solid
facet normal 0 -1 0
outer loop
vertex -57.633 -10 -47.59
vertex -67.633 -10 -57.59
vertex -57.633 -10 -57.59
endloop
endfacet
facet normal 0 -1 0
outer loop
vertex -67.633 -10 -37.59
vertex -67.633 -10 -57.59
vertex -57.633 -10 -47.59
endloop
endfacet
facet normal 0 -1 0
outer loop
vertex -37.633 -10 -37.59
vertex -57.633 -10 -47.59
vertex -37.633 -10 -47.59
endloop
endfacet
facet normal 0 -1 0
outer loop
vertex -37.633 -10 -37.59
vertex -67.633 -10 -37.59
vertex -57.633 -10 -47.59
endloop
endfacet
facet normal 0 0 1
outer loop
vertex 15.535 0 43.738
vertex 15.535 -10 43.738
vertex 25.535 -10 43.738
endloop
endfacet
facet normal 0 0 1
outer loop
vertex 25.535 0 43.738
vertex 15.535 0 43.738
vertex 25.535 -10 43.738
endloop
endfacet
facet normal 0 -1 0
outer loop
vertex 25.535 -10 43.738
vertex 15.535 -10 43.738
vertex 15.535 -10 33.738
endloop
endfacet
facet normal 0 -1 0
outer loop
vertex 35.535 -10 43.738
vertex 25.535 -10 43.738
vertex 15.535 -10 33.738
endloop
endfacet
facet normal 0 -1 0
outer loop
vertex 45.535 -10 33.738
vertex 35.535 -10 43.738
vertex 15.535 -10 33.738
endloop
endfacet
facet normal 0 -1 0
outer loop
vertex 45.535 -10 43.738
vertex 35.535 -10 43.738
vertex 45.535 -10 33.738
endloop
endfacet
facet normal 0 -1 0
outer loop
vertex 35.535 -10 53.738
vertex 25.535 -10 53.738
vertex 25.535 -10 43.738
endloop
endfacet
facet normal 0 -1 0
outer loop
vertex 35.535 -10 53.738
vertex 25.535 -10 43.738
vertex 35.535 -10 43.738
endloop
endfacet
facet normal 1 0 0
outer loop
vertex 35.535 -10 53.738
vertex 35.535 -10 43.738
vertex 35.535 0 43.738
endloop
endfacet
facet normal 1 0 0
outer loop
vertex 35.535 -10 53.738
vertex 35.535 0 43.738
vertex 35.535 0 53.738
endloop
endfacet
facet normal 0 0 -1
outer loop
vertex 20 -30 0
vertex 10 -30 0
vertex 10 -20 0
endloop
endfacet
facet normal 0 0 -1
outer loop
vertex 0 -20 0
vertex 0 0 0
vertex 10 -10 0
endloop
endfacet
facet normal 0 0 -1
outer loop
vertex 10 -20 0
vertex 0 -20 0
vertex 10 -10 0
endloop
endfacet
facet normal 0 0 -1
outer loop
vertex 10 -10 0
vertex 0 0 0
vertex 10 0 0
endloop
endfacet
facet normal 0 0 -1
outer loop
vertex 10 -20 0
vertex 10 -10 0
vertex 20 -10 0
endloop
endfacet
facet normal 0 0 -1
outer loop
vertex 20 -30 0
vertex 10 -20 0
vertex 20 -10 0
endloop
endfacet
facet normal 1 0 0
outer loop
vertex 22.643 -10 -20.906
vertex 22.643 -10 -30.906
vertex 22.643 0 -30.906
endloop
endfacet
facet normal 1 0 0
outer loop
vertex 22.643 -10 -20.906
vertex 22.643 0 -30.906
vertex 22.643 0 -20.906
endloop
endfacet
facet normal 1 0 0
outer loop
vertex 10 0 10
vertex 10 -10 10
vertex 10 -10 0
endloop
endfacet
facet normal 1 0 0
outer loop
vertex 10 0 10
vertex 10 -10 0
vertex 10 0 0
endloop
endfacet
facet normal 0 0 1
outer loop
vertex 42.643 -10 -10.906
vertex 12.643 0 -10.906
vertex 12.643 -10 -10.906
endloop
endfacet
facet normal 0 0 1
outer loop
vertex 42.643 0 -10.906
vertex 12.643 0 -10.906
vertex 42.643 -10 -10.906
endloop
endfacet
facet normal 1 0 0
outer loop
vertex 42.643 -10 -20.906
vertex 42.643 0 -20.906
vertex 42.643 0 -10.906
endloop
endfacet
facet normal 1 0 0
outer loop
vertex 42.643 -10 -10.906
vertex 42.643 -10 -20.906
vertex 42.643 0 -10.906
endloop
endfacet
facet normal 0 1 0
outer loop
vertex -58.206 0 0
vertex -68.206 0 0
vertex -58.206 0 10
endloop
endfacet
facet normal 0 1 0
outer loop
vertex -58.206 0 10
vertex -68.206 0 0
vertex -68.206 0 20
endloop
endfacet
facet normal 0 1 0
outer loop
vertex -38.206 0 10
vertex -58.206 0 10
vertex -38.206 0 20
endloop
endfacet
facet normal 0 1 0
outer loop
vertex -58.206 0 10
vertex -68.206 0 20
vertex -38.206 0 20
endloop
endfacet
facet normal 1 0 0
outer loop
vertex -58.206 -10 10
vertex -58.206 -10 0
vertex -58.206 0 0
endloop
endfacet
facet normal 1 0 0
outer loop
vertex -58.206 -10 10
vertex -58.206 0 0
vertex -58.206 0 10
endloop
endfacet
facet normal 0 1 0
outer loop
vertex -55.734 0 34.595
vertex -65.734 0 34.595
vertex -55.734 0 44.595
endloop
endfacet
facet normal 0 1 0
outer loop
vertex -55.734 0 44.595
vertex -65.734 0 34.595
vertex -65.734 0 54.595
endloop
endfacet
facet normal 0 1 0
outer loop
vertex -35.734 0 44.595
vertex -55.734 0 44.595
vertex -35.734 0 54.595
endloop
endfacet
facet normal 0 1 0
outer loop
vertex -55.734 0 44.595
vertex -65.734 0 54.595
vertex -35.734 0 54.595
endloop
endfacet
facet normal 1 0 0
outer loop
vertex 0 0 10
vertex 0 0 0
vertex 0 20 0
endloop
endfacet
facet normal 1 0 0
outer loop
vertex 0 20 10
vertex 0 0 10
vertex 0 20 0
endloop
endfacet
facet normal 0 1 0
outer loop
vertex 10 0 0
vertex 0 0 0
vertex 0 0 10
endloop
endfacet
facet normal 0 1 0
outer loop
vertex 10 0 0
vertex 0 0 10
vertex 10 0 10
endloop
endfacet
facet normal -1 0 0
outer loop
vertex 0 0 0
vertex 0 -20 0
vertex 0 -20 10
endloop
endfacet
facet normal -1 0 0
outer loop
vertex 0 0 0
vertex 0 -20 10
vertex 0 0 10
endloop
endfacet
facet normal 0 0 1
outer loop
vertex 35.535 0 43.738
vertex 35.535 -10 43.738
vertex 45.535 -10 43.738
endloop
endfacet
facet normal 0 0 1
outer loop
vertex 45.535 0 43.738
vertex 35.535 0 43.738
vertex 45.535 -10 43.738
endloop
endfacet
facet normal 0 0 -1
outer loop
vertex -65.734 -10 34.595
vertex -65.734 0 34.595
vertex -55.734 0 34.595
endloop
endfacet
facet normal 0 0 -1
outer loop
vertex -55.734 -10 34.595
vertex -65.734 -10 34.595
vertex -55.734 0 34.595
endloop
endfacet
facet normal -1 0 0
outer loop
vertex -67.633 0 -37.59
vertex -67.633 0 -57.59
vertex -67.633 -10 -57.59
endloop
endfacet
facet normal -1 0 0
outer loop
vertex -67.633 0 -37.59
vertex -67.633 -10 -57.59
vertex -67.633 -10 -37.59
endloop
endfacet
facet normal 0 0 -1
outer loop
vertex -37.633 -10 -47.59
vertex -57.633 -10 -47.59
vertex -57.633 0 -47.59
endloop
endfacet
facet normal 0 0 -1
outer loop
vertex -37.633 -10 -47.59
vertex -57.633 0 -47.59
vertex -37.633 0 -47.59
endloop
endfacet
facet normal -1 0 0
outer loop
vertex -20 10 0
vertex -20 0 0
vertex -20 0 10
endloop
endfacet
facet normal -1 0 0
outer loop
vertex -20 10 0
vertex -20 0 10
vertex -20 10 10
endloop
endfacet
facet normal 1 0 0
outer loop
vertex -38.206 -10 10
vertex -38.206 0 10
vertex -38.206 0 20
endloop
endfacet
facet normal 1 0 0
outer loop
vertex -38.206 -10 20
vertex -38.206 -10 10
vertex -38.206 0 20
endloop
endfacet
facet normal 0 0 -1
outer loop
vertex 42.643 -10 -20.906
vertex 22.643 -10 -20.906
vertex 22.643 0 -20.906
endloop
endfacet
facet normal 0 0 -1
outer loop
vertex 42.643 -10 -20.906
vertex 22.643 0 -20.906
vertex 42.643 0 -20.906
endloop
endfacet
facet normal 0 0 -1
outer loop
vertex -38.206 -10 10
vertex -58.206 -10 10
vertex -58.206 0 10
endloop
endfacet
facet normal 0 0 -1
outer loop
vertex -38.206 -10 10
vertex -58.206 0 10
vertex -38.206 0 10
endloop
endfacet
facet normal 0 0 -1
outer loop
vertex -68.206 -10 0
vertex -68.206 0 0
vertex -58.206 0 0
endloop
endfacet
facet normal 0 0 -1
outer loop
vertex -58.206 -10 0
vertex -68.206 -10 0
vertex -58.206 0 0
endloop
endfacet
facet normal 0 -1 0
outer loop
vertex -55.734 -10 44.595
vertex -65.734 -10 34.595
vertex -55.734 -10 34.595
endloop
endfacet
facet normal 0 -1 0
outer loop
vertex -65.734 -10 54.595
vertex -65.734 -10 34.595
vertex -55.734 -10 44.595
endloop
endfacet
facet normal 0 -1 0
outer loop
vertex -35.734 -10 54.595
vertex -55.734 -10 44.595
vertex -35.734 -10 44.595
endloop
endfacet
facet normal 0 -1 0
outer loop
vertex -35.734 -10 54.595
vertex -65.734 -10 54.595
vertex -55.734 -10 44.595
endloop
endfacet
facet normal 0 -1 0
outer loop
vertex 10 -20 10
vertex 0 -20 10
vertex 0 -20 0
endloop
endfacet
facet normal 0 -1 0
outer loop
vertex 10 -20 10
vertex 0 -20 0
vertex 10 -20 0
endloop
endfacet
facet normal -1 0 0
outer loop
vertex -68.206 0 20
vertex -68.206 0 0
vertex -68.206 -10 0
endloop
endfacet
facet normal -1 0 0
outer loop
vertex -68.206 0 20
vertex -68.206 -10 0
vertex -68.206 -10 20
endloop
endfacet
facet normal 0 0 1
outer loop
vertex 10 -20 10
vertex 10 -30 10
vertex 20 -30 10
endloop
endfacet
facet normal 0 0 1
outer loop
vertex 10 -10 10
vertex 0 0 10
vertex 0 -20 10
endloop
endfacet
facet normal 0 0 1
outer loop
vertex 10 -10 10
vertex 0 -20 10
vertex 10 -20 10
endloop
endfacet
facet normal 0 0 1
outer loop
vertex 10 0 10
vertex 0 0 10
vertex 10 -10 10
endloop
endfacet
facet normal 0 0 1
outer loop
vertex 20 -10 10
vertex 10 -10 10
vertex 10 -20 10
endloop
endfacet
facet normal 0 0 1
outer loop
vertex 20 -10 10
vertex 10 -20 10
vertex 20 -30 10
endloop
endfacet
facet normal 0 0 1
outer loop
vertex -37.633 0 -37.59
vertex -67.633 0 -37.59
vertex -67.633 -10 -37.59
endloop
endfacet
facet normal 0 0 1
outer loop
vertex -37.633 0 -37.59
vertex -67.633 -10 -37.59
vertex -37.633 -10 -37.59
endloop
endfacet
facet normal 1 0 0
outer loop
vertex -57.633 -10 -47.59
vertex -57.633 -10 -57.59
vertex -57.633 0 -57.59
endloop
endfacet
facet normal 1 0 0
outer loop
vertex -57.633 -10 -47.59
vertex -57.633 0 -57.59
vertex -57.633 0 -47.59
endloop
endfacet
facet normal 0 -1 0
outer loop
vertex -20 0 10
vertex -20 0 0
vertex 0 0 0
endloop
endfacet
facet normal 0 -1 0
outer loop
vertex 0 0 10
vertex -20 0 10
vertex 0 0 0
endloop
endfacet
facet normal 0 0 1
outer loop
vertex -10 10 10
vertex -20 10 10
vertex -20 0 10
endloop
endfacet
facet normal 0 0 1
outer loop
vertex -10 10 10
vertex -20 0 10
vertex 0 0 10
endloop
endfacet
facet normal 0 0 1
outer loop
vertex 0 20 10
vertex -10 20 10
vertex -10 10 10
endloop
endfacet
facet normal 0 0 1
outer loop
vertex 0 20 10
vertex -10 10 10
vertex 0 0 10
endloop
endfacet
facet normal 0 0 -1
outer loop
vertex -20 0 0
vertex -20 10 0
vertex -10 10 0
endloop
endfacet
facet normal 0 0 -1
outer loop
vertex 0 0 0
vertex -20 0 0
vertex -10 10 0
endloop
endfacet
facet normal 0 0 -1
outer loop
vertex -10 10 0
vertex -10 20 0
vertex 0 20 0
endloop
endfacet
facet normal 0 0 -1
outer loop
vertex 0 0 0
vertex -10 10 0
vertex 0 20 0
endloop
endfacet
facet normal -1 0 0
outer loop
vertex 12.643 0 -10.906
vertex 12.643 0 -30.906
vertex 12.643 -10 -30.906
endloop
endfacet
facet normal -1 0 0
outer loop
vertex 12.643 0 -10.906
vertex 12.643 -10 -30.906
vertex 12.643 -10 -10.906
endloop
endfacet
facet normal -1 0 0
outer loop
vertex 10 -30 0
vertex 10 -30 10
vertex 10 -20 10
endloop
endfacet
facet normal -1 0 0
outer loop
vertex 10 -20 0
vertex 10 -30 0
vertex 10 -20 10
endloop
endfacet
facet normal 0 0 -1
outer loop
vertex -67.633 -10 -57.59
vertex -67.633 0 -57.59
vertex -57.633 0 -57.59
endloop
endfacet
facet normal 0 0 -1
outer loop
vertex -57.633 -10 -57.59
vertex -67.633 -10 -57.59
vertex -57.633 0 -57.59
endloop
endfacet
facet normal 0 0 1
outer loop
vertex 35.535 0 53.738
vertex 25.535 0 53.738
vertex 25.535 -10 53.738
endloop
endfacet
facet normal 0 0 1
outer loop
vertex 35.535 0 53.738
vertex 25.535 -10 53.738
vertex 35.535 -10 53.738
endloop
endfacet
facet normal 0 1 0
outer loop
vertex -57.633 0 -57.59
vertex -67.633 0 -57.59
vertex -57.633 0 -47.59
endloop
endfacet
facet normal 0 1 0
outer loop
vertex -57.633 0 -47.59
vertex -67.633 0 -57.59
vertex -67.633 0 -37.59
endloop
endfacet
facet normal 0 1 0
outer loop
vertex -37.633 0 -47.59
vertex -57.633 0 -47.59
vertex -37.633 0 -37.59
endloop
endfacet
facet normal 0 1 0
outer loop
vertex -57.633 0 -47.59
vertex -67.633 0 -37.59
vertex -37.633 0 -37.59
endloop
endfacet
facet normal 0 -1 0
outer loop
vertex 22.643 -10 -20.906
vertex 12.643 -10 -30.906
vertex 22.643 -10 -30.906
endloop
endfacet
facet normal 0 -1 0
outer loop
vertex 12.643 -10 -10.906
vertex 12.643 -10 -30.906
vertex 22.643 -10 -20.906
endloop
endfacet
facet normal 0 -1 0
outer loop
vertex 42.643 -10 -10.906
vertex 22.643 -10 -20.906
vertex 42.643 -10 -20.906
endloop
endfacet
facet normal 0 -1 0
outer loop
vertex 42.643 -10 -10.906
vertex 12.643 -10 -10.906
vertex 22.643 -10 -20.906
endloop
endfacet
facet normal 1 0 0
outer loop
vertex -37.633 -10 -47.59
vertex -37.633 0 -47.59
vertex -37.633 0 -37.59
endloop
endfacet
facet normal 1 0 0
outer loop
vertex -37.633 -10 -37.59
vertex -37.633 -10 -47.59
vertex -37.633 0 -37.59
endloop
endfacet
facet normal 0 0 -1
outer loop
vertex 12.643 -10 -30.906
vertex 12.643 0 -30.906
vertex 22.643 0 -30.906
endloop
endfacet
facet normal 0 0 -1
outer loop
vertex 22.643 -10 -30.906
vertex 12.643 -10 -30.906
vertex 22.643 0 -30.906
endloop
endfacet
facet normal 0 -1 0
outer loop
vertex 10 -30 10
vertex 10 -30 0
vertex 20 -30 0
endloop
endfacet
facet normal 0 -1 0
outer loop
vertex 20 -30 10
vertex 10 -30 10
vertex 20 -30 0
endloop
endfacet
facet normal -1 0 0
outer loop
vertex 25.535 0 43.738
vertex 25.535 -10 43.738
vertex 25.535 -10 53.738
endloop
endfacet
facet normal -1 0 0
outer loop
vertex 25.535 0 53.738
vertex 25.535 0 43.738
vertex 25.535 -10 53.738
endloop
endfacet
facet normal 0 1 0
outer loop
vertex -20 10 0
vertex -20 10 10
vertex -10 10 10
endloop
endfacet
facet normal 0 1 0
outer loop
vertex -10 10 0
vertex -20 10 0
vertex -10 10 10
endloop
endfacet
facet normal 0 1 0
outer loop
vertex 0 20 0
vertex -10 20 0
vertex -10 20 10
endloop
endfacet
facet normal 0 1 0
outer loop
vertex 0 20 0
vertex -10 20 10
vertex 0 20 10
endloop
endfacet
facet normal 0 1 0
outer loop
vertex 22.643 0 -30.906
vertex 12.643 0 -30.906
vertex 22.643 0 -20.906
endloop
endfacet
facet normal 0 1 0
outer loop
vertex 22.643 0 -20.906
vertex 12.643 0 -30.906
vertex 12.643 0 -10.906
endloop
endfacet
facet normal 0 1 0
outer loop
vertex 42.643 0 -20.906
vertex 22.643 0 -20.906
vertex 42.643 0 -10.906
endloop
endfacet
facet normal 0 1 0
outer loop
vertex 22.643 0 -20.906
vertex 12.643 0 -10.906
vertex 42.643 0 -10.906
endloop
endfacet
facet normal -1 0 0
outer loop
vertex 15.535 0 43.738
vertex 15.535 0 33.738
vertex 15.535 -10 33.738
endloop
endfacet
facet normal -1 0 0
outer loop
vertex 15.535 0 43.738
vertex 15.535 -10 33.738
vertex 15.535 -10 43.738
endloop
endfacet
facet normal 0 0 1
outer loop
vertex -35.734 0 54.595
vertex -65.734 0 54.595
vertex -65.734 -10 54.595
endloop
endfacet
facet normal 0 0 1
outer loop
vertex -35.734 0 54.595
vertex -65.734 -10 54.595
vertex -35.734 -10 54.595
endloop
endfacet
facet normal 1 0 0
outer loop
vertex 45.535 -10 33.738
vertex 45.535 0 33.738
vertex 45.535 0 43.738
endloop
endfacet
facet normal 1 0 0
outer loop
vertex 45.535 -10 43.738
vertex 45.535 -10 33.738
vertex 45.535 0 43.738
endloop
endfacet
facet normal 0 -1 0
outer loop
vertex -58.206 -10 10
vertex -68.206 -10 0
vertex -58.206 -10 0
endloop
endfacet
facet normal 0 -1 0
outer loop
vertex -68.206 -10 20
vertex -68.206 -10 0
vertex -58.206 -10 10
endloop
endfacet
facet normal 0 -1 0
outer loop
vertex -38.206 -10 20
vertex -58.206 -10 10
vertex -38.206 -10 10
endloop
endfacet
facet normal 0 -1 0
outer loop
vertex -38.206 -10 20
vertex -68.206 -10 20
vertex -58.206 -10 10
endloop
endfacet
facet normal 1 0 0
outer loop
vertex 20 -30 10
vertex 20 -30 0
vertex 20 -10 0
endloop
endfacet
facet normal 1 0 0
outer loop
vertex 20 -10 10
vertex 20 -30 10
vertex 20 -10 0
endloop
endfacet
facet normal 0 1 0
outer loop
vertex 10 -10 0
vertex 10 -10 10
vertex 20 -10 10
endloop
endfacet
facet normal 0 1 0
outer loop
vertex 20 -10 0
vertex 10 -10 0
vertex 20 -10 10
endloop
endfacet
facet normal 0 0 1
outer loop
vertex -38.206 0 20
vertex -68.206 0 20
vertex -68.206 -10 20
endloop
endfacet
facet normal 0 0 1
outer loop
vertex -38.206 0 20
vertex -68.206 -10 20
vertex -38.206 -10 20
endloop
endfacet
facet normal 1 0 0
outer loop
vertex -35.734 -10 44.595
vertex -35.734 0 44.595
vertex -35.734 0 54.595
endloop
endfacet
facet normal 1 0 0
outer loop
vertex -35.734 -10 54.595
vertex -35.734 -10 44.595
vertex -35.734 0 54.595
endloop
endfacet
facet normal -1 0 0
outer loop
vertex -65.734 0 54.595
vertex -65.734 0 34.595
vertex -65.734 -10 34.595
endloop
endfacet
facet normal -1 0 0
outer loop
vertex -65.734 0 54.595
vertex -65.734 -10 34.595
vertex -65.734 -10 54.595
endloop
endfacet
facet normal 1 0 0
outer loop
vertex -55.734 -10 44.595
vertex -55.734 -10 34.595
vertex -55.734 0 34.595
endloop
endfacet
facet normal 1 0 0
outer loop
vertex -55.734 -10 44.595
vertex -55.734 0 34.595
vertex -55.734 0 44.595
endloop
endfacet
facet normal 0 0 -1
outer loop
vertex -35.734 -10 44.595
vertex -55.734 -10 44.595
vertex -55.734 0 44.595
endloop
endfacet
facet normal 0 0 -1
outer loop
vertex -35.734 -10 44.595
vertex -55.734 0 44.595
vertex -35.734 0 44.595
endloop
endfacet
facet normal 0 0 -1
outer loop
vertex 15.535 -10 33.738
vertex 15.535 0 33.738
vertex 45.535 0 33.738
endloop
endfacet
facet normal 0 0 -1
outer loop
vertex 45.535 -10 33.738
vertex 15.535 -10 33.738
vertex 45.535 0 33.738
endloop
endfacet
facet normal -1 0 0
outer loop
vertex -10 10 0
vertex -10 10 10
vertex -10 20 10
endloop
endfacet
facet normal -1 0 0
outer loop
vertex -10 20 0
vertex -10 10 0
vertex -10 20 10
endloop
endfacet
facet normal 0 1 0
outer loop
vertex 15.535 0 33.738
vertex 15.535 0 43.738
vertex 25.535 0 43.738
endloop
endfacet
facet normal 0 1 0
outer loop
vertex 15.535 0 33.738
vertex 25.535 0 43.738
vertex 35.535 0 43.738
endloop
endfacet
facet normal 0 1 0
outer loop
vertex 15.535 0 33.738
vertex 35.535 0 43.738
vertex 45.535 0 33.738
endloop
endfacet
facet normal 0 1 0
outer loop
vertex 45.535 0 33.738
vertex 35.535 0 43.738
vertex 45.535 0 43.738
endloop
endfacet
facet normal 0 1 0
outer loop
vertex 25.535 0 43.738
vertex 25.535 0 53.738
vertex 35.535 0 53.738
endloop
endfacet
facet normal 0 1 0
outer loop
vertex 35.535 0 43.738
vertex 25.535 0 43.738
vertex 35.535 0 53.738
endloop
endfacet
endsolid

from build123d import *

# Parameters (mm, degrees)
F0_W      = 20
F0_H      = 30
F1_DEPTH  = 10
F3_W      = 20
F3_H      = 20
F4_DEPTH  = 10
F6_W      = 10
F6_H      = 10
F7_DEPTH  = 10
F2_W      = 10
F2_H      = 10
F8_DEPTH  = 10
F9_W      = 30
F9_H      = 20
F10_DEPTH = 10
F11_W     = 20
F11_H     = 10
F12_DEPTH = 10
F13_W     = 30
F13_H     = 20
F14_DEPTH = 10
F15_W     = 20
F15_H     = 10
F16_DEPTH = 10
F17_W     = 30
F17_H     = 20
F18_DEPTH = 10
F19_W     = 10
F19_H     = 10
F20_DEPTH = 10
F21_W     = 30
F21_H     = 20
F22_DEPTH = 10
F23_W     = 30
F23_H     = 20
F24_DEPTH = 10
F25_W     = 20
F25_H     = 10
F26_DEPTH = 10
F27_W     = 20
F27_H     = 10
F28_DEPTH = 10


with BuildPart() as f1:
    # F0 (on Top) → F1 (new body)
    with BuildSketch(Plane.XY):
        with Locations((10, -15)):
            Rectangle(F0_W, F0_H)
    extrude(amount=F1_DEPTH)

    # F2 (on face) → F8 (cut)
    with BuildSketch(Plane.XY.offset(10)):
        with Locations((15, -5)):
            Rectangle(F2_W, F2_H)
        with Locations((5, -25)):
            Rectangle(F2_W, F2_H)
    extrude(amount=-F8_DEPTH, mode=Mode.SUBTRACT)


with BuildPart() as f4:
    # F3 (on Top) → F4 (new body)
    with BuildSketch(Plane.XY):
        with Locations((-10, 10)):
            Rectangle(F3_W, F3_H)
    extrude(amount=F4_DEPTH)

    # F6 (on face) → F7 (cut)
    with BuildSketch(Plane.XY.offset(10)):
        with Locations((-15, 15)):
            Rectangle(F6_W, F6_H)
    extrude(amount=-F7_DEPTH, mode=Mode.SUBTRACT)


with BuildPart() as f10:
    # F9 (on Front) → F10 (new body)
    with BuildSketch(Plane.XZ):
        with Locations((-53.2064592838, 10)):
            Rectangle(F9_W, F9_H)
    extrude(amount=F10_DEPTH)

    # F11 (on face) → F12 (cut)
    with BuildSketch(Plane.XZ.offset(10)):
        with Locations((-48.2064592838, 5)):
            Rectangle(F11_W, F11_H)
    extrude(amount=-F12_DEPTH, mode=Mode.SUBTRACT)


with BuildPart() as f14:
    # F13 (on Front) → F14 (new body)
    with BuildSketch(Plane.XZ):
        with Locations((-52.6328837872, -47.5899481773)):
            Rectangle(F13_W, F13_H)
    extrude(amount=F14_DEPTH)

    # F15 (on face) → F16 (cut)
    with BuildSketch(Plane.XZ.offset(10)):
        with Locations((-47.6328837872, -52.5899481773)):
            Rectangle(F15_W, F15_H)
    extrude(amount=-F16_DEPTH, mode=Mode.SUBTRACT)


with BuildPart() as f18:
    # F17 (on Front) → F18 (new body)
    with BuildSketch(Plane.XZ):
        with Locations((30.5351590365, 43.7379798293)):
            Rectangle(F17_W, F17_H)
    extrude(amount=F18_DEPTH)

    # F19 (on face) → F20 (cut)
    with BuildSketch(Plane.XZ.offset(10)):
        with Locations((20.5351590365, 48.7379798293)):
            Rectangle(F19_W, F19_H)
        with Locations((40.5351590365, 48.7379798293)):
            Rectangle(F19_W, F19_H)
    extrude(amount=-F20_DEPTH, mode=Mode.SUBTRACT)


with BuildPart() as f22:
    # F21 (on Front) → F22 (new body)
    with BuildSketch(Plane.XZ):
        with Locations((-50.7335147262, 44.5948152244)):
            Rectangle(F21_W, F21_H)
    extrude(amount=F22_DEPTH)

    # F25 (on face) → F26 (cut)
    with BuildSketch(Plane.XZ.offset(10)):
        with Locations((-45.7335147262, 39.5948152244)):
            Rectangle(F25_W, F25_H)
    extrude(amount=-F26_DEPTH, mode=Mode.SUBTRACT)


with BuildPart() as f24:
    # F23 (on Front) → F24 (new body)
    with BuildSketch(Plane.XZ):
        with Locations((27.6432627439, -20.9057831764)):
            Rectangle(F23_W, F23_H)
    extrude(amount=F24_DEPTH)

    # F27 (on face) → F28 (cut)
    with BuildSketch(Plane.XZ.offset(10)):
        with Locations((32.6432627439, -25.9057831764)):
            Rectangle(F27_W, F27_H)
    extrude(amount=-F28_DEPTH, mode=Mode.SUBTRACT)


solid = Compound([f1.part, f4.part, f10.part, f14.part, f18.part, f22.part, f24.part])
